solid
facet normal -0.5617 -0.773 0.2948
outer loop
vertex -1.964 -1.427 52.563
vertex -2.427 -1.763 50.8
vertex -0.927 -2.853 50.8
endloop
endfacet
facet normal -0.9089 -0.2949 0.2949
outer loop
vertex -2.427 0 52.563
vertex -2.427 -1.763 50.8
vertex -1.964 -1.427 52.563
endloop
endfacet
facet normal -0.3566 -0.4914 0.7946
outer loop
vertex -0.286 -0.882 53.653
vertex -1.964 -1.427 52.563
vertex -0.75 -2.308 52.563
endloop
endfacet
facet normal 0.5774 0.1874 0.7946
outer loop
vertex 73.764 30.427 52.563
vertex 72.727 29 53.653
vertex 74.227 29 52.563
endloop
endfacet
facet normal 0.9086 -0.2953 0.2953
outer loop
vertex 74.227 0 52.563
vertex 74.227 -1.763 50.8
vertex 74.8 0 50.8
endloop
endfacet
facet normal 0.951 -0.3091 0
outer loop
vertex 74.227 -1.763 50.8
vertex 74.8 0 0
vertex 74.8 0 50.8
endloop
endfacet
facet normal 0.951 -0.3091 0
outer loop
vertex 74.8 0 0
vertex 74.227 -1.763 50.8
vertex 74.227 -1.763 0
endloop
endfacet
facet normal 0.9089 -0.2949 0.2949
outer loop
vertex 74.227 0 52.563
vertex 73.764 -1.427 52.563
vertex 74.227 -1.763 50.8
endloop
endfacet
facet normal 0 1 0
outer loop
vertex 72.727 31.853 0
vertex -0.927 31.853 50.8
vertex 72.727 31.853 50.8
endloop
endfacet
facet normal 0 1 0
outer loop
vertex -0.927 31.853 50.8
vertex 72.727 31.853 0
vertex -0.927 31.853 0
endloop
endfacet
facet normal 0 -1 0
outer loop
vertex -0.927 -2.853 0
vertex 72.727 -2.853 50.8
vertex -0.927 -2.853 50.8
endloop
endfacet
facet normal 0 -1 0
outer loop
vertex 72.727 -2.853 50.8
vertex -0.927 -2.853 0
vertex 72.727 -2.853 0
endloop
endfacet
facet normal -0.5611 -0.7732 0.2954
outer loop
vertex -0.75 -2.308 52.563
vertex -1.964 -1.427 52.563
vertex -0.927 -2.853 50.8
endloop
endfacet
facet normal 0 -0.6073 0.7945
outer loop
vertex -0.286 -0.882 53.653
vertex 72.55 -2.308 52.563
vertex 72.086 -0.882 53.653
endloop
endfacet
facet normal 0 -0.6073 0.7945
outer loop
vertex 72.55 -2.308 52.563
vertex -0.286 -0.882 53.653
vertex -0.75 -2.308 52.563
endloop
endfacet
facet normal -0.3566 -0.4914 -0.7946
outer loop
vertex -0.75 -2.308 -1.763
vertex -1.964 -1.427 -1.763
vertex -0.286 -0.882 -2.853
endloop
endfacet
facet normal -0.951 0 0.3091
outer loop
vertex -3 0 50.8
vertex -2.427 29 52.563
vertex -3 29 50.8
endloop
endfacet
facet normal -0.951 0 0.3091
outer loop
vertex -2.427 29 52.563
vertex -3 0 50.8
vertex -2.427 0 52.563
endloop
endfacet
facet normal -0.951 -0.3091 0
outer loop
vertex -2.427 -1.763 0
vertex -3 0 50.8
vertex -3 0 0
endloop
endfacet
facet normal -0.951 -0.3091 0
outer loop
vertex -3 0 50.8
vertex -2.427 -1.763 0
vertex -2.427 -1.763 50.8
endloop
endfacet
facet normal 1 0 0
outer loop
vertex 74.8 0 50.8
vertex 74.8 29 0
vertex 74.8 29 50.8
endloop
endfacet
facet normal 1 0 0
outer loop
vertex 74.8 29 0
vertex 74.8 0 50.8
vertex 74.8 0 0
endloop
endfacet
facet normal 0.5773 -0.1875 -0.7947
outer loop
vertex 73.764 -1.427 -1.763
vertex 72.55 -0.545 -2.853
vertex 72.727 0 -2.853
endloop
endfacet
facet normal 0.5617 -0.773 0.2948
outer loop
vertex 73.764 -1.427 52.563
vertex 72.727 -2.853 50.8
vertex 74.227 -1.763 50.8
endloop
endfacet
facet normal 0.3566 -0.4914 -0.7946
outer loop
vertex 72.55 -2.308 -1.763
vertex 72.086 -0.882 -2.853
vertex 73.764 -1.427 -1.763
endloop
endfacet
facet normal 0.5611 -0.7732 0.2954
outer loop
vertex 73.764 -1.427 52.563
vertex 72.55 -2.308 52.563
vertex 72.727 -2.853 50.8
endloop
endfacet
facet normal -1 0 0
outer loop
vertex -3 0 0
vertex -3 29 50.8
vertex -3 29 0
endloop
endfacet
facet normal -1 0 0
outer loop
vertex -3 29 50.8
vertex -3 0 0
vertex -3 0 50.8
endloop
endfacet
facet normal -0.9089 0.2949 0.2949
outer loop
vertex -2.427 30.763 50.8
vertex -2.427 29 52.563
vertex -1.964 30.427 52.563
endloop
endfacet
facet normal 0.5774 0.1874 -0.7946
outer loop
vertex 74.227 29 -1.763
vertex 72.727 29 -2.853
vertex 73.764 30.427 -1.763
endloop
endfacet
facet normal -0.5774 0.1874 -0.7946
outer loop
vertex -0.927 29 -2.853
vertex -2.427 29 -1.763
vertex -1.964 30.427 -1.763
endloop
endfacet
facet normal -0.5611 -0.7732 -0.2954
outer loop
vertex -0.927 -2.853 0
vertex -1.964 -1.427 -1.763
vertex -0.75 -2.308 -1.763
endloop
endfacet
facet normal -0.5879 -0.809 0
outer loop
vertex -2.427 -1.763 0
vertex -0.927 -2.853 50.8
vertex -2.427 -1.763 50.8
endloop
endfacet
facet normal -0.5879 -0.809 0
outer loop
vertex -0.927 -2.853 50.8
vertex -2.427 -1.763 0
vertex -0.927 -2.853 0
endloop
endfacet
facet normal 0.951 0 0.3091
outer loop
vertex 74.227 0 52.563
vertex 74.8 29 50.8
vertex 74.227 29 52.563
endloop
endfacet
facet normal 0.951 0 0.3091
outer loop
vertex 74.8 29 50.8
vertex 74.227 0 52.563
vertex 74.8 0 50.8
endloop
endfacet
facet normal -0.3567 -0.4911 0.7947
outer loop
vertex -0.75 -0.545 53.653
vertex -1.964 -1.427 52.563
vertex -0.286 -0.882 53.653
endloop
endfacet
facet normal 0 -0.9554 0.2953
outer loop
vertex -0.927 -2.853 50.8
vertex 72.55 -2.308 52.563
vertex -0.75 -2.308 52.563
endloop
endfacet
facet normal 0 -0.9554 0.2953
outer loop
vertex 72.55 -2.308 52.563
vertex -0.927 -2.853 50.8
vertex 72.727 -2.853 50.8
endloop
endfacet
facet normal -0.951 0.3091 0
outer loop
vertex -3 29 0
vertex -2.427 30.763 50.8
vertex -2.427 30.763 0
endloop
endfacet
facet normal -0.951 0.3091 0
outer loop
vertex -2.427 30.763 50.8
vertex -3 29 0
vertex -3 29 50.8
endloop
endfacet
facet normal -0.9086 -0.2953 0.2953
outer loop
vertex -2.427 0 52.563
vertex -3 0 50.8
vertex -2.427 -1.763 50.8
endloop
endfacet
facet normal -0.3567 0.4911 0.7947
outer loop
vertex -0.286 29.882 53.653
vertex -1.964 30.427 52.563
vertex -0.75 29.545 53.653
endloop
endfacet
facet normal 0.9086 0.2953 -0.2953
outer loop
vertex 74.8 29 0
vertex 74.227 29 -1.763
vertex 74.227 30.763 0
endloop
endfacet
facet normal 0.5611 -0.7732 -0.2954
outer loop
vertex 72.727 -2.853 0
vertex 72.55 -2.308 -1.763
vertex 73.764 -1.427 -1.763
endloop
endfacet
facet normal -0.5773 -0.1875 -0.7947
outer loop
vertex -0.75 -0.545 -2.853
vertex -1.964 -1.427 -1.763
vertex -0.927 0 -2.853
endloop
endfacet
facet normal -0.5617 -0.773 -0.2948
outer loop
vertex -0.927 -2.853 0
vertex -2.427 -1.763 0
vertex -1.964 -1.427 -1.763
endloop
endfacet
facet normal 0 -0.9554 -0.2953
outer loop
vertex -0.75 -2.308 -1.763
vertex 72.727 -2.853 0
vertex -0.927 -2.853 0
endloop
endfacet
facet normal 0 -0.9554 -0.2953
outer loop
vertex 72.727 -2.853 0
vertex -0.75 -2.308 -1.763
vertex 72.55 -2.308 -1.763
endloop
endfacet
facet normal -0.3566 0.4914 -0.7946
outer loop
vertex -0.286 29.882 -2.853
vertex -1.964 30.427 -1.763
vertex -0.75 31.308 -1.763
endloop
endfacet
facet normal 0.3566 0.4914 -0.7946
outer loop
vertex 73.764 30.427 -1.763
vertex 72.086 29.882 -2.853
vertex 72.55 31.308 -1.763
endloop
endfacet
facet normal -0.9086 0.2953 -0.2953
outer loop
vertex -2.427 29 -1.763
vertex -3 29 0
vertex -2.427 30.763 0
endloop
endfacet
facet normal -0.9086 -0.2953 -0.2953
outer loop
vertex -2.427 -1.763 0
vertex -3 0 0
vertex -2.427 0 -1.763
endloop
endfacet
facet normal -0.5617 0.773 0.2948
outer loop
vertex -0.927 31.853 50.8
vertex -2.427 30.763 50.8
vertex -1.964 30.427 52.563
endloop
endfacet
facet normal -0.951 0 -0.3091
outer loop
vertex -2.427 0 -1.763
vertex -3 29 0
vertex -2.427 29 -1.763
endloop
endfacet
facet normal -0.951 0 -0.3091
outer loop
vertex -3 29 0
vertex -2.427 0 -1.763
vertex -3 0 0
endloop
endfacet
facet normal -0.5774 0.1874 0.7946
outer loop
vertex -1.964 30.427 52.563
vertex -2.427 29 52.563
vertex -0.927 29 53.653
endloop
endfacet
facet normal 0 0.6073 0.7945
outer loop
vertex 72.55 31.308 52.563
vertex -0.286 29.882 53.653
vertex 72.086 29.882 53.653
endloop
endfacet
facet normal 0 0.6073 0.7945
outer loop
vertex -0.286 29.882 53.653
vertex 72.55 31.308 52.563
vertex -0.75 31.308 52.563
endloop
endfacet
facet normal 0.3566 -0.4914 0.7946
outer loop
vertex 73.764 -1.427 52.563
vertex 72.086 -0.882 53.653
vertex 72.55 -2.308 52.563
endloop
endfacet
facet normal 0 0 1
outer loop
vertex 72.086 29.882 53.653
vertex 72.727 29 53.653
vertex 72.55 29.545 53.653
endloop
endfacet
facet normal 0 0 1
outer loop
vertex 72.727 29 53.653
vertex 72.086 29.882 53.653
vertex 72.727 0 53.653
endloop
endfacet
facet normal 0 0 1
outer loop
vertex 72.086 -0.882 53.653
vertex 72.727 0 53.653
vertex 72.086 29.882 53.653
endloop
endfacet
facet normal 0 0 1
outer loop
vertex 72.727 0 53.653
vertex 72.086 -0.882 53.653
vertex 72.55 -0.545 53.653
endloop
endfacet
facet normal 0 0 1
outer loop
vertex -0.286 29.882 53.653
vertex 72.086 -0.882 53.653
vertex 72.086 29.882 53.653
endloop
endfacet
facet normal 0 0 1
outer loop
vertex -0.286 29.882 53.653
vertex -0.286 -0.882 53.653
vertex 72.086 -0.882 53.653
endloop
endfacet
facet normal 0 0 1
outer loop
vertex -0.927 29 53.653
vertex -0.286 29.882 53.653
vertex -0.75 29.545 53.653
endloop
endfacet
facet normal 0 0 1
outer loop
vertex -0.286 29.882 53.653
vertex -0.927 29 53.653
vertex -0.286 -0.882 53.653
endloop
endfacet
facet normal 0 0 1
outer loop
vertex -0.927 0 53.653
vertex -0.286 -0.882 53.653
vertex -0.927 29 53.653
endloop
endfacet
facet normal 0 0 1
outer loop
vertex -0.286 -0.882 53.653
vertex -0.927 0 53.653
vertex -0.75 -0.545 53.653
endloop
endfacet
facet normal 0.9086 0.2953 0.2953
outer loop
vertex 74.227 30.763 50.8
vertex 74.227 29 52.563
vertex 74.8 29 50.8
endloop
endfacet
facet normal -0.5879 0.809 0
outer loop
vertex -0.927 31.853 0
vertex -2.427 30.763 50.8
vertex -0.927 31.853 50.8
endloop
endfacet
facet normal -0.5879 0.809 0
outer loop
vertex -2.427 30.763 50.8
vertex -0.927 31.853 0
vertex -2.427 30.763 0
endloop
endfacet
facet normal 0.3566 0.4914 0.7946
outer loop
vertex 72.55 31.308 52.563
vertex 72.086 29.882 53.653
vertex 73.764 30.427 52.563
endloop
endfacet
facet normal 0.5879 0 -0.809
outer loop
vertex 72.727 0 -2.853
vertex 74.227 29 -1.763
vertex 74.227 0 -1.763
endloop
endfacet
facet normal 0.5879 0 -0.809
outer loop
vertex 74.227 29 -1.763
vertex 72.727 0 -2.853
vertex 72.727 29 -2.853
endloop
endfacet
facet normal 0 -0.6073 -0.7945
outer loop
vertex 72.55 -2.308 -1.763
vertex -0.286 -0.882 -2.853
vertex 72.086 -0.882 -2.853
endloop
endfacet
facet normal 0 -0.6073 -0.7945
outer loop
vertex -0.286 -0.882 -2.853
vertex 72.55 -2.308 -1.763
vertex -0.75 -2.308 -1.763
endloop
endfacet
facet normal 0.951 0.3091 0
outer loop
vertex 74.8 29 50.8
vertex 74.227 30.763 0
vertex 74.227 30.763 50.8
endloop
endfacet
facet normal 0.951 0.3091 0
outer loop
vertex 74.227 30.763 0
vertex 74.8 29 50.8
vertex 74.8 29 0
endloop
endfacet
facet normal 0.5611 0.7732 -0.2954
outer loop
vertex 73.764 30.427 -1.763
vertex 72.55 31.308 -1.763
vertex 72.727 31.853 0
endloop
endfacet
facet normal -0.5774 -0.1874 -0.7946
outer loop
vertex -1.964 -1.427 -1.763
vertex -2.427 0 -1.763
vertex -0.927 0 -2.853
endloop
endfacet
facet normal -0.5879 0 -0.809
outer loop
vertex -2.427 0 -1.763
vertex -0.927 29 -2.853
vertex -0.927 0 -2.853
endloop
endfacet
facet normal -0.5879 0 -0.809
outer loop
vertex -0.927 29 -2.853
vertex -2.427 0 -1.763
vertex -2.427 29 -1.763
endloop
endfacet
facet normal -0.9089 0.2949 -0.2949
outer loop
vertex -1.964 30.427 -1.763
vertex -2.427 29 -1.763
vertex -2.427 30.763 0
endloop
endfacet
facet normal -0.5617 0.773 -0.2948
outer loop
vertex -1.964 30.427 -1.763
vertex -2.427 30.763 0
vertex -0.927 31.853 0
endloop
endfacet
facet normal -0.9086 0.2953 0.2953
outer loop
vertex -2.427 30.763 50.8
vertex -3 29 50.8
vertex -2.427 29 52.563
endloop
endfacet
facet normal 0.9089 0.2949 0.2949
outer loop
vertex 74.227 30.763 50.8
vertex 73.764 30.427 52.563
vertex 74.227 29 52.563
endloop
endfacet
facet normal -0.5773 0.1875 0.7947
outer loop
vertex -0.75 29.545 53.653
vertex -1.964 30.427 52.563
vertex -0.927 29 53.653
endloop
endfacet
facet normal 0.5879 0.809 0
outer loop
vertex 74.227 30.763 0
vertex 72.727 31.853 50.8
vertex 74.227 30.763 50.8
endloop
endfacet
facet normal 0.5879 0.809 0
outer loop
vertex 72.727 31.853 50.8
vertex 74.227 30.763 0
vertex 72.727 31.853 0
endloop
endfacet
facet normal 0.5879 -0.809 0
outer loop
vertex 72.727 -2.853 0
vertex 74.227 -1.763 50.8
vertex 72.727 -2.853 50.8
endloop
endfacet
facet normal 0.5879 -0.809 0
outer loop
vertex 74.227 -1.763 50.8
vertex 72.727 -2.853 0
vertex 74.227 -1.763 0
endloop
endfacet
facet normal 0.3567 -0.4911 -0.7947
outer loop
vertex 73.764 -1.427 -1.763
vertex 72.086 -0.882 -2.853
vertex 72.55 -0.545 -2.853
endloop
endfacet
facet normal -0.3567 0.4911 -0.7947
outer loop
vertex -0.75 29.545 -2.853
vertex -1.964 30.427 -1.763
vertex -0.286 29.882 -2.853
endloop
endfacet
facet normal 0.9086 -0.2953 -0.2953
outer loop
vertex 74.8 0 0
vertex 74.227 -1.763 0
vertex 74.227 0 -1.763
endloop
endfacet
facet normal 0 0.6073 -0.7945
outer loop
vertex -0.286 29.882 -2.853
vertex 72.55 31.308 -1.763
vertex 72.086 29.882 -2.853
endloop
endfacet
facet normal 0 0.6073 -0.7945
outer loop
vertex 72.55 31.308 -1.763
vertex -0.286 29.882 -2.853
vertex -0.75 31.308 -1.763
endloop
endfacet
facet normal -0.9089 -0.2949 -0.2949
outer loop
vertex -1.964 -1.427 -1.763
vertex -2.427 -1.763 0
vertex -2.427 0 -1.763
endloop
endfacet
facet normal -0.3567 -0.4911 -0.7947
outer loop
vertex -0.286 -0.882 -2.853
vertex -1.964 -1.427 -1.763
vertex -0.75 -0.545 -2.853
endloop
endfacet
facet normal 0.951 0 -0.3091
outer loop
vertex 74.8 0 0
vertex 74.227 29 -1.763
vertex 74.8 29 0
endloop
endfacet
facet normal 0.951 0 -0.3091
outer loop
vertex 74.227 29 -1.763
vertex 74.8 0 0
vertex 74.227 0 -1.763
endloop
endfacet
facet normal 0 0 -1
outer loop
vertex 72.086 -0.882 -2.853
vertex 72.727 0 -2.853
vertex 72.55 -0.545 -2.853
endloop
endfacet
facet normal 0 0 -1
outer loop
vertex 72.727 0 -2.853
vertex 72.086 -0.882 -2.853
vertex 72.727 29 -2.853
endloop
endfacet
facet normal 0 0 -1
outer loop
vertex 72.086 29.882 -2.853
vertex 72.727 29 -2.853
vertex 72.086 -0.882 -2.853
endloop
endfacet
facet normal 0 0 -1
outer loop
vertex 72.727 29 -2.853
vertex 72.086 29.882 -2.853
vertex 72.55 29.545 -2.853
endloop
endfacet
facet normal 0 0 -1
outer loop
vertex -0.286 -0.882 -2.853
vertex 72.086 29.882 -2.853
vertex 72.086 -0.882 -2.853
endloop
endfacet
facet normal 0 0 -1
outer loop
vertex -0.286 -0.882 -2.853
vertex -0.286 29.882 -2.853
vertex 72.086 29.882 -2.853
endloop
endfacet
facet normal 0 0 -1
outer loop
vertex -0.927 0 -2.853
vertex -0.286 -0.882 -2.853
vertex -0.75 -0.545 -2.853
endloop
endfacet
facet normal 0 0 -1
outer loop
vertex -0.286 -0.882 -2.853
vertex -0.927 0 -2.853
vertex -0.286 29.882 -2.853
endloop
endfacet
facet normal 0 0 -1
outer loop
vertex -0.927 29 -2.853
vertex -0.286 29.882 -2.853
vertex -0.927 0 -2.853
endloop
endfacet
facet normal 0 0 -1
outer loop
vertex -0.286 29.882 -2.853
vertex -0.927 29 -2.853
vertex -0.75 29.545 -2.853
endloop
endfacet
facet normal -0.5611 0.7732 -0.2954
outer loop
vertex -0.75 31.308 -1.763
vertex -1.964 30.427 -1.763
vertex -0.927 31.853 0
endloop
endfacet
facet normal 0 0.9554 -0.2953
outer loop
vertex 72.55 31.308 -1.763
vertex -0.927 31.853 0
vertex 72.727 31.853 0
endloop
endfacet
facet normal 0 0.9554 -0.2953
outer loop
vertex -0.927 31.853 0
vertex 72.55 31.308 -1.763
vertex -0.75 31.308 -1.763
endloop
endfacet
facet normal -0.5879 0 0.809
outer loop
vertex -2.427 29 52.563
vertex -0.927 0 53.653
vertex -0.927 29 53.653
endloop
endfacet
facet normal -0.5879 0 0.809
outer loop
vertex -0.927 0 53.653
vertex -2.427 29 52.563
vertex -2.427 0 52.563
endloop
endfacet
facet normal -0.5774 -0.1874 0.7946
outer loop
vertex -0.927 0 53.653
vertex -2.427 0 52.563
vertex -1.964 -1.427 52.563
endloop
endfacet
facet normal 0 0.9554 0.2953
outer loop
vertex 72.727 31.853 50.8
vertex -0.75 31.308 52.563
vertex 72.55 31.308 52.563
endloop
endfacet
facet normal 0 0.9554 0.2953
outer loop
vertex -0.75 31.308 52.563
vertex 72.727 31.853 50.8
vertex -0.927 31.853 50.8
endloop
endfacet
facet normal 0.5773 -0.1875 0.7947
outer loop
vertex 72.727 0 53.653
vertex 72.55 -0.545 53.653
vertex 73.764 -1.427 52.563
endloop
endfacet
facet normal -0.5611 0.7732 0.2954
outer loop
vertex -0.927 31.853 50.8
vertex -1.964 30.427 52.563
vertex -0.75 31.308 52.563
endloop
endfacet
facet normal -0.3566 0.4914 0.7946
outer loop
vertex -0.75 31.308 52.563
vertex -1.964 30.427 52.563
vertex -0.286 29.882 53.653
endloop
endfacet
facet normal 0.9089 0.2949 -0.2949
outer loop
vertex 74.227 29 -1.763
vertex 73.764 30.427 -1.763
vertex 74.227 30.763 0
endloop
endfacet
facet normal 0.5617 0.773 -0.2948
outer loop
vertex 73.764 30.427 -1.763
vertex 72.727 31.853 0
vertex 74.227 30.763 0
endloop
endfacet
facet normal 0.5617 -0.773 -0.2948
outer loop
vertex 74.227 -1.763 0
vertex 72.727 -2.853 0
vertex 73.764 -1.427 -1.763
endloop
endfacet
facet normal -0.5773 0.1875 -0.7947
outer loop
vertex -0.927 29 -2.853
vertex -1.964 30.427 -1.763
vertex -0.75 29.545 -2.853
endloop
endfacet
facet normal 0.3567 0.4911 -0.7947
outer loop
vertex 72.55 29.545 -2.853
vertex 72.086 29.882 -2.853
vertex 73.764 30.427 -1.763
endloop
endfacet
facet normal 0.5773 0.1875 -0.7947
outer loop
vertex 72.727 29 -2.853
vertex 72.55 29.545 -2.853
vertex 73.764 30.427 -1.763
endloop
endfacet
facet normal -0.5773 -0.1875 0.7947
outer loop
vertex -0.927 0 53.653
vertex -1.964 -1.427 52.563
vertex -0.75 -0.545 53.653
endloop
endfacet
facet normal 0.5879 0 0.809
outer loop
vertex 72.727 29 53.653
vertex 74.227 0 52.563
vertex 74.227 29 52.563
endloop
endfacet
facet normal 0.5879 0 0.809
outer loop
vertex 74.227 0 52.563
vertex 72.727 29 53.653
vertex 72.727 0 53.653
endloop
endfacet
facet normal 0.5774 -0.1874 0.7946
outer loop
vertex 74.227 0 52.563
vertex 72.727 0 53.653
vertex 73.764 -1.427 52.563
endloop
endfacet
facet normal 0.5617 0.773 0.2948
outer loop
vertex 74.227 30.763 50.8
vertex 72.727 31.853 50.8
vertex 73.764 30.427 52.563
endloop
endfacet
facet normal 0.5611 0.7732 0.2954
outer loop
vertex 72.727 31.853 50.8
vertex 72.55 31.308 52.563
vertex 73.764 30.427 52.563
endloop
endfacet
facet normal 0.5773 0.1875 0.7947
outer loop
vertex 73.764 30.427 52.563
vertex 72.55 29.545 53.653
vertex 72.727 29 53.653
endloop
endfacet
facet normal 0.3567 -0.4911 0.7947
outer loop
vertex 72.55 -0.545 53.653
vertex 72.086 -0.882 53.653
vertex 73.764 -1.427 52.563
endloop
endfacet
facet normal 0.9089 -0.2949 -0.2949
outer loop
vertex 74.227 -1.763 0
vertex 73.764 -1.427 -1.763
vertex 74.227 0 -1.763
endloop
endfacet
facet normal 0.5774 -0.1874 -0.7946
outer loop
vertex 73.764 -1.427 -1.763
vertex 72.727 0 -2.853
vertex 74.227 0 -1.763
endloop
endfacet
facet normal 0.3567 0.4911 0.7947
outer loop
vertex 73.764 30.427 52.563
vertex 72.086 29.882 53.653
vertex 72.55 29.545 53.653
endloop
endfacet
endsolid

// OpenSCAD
// GoPro Hero-style camera dimensions
camera_width = 71.8;
camera_height = 50.8;
camera_depth = 29;        // Approximate body without lens
lens_depth = 4.6;         // Protrusion of lens (total 33.6 - 29)
lens_diameter = 26;       // Approximate lens diameter
lens_offset_x = 53;       // X offset from left
lens_offset_y = 36;       // Y offset from bottom

// Main camera body
difference() 
{
    roundedCube([camera_width, camera_depth, camera_height], 3);
    
    // Optional: add holes or mounts here
}

// Front lens (cylindrical protrusion)
translate([lens_offset_x, camera_depth, lens_offset_y])
    rotate([90, 0, 0])
        cylinder(h = lens_depth, d = lens_diameter, $fn = 100);


// Utility: Rounded cube module
module roundedCube(size, radius) {
    hull() {
        for (x = [0, size[0]])
            for (y = [0, size[1]])
                for (z = [0, size[2]])
                    translate([x, y, z])
                        sphere(r = radius);
    }
}
